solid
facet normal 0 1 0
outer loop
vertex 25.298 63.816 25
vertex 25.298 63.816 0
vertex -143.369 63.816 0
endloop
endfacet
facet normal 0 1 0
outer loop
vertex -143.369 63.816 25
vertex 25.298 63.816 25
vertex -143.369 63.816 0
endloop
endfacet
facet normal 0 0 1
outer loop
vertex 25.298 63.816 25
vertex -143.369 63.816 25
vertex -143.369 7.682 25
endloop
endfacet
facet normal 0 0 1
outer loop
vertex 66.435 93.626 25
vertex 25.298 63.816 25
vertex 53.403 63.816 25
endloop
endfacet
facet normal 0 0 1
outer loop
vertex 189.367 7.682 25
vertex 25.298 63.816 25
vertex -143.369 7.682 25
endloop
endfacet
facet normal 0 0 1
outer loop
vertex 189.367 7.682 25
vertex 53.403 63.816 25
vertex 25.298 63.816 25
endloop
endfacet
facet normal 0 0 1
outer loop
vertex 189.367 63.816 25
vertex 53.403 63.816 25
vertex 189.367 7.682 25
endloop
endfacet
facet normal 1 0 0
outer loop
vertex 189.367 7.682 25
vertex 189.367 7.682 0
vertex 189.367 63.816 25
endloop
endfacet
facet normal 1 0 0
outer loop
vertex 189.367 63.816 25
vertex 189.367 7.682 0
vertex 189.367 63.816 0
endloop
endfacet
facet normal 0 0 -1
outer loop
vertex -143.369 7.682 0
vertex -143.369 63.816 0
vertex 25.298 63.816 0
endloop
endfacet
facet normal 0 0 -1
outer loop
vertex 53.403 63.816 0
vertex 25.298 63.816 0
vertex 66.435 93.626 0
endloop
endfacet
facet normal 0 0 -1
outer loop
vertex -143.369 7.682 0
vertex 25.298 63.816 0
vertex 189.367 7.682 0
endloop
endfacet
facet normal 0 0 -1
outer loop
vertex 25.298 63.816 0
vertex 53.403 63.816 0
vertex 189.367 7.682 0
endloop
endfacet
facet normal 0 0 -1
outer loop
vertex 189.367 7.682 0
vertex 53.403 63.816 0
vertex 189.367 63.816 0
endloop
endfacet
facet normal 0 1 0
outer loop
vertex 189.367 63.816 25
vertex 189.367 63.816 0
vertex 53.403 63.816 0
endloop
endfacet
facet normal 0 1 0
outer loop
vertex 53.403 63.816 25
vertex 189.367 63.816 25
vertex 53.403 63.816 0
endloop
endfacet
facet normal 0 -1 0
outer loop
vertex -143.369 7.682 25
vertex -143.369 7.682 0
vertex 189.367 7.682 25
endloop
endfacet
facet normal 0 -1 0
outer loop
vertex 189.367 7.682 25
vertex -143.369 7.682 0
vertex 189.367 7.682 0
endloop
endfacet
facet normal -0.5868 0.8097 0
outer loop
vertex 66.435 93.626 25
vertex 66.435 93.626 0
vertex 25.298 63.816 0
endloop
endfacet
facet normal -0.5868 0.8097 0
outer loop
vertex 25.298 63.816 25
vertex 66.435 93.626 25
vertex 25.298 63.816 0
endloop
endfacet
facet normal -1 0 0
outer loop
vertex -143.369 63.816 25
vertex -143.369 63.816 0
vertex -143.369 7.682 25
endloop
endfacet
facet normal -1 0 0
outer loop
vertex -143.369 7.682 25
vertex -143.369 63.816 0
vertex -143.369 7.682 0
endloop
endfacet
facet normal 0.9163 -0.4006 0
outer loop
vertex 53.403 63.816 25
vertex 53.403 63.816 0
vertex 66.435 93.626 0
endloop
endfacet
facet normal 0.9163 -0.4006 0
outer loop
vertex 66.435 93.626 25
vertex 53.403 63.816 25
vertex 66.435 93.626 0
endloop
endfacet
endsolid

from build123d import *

# Parameters (mm, degrees)
F1_DEPTH = 25


with BuildPart() as f1:
    # F0 (on Top) → F1 (new body)
    with BuildSketch(Plane.XY):
        Polygon((-143.368647, 7.681685), (-52.16566, 7.681685), (25.298358, 63.81616), (-143.368647, 63.81616), align=None)
        Polygon((25.298358, 63.81616), (-52.16566, 7.681685), (189.367071, 7.681685), (189.367071, 63.81616), (53.402534, 63.81616), align=None)
        Polygon((66.434935, 93.625873), (25.298358, 63.81616), (53.402534, 63.81616), align=None)
    extrude(amount=F1_DEPTH)


solid = f1.part
